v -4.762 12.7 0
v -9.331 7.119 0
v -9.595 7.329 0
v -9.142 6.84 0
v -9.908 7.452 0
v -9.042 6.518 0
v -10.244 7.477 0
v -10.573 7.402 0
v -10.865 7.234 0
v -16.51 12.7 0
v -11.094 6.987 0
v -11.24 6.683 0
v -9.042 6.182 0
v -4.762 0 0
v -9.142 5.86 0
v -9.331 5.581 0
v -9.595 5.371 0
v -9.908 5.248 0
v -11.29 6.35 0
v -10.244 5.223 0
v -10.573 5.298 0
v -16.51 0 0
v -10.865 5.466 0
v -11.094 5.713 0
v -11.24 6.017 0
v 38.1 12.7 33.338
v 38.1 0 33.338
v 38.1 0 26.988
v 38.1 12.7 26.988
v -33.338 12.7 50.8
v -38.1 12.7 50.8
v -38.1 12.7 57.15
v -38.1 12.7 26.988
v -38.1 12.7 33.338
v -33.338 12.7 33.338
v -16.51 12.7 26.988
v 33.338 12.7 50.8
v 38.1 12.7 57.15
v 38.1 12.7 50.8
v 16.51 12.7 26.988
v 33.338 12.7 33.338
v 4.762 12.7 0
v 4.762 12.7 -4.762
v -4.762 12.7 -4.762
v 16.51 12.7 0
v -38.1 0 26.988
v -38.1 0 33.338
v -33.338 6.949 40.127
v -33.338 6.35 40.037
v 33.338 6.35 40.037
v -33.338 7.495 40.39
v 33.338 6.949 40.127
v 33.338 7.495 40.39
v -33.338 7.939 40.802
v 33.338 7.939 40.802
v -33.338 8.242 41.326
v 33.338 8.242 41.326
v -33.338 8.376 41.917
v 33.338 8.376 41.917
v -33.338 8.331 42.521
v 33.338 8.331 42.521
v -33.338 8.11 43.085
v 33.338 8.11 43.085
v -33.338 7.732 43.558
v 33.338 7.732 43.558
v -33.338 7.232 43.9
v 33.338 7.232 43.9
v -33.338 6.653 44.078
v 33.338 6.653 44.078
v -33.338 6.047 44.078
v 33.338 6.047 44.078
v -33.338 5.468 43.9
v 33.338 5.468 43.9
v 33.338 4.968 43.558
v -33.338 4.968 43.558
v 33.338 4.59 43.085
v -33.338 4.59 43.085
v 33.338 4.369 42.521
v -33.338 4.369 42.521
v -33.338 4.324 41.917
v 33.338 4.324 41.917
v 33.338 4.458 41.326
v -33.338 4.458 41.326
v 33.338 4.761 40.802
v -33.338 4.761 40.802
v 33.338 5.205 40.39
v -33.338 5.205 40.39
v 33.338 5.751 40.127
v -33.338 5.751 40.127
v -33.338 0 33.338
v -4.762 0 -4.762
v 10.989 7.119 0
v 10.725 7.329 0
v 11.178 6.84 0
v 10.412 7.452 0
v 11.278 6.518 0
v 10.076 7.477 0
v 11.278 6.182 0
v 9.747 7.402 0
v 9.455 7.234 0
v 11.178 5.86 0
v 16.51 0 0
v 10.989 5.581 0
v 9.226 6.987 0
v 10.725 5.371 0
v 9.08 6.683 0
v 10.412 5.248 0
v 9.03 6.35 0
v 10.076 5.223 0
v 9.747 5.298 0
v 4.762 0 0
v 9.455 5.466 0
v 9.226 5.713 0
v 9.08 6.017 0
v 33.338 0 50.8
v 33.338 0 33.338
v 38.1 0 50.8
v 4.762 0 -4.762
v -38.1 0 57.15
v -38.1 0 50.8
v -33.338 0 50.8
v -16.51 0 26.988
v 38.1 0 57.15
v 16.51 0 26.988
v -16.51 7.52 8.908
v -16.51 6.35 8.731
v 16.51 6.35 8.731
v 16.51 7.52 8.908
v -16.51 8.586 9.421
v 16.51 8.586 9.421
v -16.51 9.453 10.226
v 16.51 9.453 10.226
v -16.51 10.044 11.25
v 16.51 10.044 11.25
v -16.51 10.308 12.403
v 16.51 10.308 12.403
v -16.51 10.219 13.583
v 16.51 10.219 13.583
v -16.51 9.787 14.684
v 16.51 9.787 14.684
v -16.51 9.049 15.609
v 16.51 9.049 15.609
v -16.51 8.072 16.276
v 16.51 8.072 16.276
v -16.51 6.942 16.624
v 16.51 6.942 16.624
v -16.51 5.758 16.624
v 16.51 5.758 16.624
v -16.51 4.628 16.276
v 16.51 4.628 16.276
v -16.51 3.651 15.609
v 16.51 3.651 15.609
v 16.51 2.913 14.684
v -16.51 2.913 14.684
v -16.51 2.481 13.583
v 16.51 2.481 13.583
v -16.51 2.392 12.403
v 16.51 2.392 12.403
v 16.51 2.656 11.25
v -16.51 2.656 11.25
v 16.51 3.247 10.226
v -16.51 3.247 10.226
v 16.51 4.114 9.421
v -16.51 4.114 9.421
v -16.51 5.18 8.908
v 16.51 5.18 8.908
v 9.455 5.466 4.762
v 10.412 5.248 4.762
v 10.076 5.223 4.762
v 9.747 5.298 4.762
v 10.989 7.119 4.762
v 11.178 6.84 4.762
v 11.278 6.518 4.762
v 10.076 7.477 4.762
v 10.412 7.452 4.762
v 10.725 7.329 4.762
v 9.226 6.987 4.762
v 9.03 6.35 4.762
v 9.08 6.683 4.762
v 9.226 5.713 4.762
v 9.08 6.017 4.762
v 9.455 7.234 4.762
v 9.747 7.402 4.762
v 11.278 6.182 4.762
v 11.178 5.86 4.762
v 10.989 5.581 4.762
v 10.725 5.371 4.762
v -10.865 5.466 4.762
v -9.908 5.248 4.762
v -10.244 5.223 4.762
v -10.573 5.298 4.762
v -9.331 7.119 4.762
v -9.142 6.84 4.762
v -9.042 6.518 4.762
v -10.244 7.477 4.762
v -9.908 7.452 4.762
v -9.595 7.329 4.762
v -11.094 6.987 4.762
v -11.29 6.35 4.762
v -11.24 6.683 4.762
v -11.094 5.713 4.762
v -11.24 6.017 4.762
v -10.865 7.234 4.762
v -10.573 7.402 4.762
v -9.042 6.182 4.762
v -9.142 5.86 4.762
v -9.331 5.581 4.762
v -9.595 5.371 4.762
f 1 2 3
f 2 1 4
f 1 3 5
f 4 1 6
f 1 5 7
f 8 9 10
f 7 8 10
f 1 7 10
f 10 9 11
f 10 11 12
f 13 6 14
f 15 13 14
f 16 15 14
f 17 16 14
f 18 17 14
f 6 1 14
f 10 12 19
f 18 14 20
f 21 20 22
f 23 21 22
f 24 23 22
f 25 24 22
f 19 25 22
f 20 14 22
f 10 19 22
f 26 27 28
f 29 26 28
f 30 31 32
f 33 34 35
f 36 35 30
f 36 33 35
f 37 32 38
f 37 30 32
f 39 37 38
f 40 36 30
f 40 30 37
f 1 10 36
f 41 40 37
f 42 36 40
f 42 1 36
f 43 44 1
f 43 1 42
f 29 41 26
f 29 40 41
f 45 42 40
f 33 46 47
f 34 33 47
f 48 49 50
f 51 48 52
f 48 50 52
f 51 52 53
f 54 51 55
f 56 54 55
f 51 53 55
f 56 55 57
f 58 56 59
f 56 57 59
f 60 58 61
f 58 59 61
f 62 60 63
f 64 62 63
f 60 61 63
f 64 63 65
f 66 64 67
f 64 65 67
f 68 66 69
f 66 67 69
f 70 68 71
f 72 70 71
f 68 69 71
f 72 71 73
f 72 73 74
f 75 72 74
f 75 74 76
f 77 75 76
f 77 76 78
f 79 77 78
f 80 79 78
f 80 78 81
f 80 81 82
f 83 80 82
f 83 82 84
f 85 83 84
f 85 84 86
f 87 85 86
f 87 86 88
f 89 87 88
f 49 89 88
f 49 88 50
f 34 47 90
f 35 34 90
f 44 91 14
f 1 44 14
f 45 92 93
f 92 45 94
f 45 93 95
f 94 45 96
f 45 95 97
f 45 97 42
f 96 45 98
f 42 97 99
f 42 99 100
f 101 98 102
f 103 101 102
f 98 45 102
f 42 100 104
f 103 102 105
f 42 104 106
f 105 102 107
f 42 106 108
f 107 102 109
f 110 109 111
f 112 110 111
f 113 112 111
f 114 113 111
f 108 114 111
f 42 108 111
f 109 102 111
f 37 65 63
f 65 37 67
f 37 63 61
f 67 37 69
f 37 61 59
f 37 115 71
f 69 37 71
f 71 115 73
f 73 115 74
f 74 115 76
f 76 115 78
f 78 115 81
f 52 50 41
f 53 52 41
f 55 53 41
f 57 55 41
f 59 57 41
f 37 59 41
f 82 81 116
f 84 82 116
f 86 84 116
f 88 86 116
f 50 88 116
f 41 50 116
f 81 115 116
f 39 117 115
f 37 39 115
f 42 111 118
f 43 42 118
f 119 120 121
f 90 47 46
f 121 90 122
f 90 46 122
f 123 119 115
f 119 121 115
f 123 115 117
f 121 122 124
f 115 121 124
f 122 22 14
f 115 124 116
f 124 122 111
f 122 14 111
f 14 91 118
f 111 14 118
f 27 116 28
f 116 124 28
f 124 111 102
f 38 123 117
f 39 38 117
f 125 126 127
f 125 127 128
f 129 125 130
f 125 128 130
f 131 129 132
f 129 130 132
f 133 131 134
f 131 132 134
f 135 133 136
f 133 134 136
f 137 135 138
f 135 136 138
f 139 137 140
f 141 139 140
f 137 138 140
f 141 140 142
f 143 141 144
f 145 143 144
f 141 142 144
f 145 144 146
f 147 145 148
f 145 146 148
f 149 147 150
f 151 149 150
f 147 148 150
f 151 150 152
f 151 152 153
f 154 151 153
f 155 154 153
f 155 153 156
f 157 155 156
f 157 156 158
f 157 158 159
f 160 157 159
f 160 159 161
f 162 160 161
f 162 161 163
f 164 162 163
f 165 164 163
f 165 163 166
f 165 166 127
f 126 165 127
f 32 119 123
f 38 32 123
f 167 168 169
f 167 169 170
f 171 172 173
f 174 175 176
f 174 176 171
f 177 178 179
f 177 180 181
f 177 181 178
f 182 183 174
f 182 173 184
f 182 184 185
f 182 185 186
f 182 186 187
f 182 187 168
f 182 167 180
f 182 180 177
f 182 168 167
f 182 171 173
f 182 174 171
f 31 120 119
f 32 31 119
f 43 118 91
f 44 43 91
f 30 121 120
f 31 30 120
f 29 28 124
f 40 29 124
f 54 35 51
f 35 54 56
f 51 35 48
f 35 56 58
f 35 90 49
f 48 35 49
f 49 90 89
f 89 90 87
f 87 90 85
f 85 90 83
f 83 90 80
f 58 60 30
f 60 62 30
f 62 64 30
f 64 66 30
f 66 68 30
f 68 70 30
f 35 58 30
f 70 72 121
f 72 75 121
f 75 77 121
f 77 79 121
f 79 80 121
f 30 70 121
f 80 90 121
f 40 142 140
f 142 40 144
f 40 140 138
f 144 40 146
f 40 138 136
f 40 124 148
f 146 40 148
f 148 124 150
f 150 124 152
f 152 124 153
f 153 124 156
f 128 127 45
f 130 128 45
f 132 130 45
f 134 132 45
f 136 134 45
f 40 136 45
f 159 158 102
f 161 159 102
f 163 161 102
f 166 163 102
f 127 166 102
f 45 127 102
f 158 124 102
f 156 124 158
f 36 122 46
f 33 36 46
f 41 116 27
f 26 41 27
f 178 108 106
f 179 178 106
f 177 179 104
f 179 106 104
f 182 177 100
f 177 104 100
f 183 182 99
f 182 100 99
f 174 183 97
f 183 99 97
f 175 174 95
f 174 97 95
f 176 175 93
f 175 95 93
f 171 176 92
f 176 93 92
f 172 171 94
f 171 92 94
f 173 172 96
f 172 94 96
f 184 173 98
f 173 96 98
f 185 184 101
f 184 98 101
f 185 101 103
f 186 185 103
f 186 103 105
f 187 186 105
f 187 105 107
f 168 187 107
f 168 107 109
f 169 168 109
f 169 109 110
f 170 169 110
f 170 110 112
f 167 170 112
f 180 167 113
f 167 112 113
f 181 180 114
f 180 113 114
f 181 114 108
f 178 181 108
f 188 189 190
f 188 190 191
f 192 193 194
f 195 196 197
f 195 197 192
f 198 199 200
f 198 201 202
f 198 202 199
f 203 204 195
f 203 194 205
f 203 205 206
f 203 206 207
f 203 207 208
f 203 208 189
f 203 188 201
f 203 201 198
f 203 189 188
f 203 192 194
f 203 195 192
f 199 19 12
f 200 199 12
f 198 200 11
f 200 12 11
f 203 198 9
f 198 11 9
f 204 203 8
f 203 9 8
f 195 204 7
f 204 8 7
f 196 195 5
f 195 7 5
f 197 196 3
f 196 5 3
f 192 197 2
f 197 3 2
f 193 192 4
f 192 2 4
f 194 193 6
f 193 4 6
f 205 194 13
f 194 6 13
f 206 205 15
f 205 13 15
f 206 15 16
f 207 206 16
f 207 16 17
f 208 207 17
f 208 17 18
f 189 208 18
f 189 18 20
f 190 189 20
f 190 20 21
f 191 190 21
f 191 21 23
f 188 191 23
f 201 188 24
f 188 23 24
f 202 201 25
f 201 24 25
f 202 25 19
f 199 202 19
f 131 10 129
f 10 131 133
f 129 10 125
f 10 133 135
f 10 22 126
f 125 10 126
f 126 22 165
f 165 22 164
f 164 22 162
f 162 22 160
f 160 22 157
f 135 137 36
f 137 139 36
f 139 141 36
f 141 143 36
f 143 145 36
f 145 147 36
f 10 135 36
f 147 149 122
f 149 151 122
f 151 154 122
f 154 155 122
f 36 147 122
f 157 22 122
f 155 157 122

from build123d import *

# Parameters (mm, degrees)
BOSS_EXTRUDE1_DEPTH = 12.7
SKETCH2_R           = 2.032
SKETCH2_R_2         = 3.96875
CUT_EXTRUDE1_DEPTH  = 93.361945119
SKETCH3_R           = 1.1303
CUT_EXTRUDE2_DEPTH  = 4.7625


with BuildPart() as part:
    # Sketch1 → Boss-Extrude1 (new body)
    with BuildSketch(Plane(origin=(0, 0, 0), x_dir=(1, 0, 0), z_dir=(0, 1, 0))):
        Polygon((16.51, 0), (4.7625, 0), (4.7625, 4.7625), (-4.7625, 4.7625), (-4.7625, 0), (-16.51, 0), (-16.51, -26.9875), (-38.1, -26.9875), (-38.1, -33.3375), (-33.3375, -33.3375), (-33.3375, -50.8), (-38.1, -50.8), (-38.1, -57.15), (38.1, -57.15), (38.1, -50.8), (33.3375, -50.8), (33.3375, -33.3375), (38.1, -33.3375), (38.1, -26.9875), (16.51, -26.9875), align=None)
    extrude(amount=BOSS_EXTRUDE1_DEPTH)

    # Sketch2 → Cut-Extrude1 (cut, through all)
    with BuildSketch(Plane(origin=(33.3375, 0, 0), x_dir=(0, 0, -1), z_dir=(1, 0, 0))):
        with Locations((-42.06875, 6.35)):
            Circle(SKETCH2_R)
        with Locations((-12.7, 6.35)):
            Circle(SKETCH2_R_2)
    extrude(amount=-CUT_EXTRUDE1_DEPTH, mode=Mode.SUBTRACT)

    # Sketch3 → Cut-Extrude2 (cut)
    with BuildSketch(Plane(origin=(0, 0, 0), x_dir=(-1, 0, 0), z_dir=(0, 0, -1))):
        with Locations((-10.16, 6.35)):
            Circle(SKETCH3_R)
        with Locations((10.16, 6.35)):
            Circle(SKETCH3_R)
    extrude(amount=-CUT_EXTRUDE2_DEPTH, mode=Mode.SUBTRACT)


solid = part.part
